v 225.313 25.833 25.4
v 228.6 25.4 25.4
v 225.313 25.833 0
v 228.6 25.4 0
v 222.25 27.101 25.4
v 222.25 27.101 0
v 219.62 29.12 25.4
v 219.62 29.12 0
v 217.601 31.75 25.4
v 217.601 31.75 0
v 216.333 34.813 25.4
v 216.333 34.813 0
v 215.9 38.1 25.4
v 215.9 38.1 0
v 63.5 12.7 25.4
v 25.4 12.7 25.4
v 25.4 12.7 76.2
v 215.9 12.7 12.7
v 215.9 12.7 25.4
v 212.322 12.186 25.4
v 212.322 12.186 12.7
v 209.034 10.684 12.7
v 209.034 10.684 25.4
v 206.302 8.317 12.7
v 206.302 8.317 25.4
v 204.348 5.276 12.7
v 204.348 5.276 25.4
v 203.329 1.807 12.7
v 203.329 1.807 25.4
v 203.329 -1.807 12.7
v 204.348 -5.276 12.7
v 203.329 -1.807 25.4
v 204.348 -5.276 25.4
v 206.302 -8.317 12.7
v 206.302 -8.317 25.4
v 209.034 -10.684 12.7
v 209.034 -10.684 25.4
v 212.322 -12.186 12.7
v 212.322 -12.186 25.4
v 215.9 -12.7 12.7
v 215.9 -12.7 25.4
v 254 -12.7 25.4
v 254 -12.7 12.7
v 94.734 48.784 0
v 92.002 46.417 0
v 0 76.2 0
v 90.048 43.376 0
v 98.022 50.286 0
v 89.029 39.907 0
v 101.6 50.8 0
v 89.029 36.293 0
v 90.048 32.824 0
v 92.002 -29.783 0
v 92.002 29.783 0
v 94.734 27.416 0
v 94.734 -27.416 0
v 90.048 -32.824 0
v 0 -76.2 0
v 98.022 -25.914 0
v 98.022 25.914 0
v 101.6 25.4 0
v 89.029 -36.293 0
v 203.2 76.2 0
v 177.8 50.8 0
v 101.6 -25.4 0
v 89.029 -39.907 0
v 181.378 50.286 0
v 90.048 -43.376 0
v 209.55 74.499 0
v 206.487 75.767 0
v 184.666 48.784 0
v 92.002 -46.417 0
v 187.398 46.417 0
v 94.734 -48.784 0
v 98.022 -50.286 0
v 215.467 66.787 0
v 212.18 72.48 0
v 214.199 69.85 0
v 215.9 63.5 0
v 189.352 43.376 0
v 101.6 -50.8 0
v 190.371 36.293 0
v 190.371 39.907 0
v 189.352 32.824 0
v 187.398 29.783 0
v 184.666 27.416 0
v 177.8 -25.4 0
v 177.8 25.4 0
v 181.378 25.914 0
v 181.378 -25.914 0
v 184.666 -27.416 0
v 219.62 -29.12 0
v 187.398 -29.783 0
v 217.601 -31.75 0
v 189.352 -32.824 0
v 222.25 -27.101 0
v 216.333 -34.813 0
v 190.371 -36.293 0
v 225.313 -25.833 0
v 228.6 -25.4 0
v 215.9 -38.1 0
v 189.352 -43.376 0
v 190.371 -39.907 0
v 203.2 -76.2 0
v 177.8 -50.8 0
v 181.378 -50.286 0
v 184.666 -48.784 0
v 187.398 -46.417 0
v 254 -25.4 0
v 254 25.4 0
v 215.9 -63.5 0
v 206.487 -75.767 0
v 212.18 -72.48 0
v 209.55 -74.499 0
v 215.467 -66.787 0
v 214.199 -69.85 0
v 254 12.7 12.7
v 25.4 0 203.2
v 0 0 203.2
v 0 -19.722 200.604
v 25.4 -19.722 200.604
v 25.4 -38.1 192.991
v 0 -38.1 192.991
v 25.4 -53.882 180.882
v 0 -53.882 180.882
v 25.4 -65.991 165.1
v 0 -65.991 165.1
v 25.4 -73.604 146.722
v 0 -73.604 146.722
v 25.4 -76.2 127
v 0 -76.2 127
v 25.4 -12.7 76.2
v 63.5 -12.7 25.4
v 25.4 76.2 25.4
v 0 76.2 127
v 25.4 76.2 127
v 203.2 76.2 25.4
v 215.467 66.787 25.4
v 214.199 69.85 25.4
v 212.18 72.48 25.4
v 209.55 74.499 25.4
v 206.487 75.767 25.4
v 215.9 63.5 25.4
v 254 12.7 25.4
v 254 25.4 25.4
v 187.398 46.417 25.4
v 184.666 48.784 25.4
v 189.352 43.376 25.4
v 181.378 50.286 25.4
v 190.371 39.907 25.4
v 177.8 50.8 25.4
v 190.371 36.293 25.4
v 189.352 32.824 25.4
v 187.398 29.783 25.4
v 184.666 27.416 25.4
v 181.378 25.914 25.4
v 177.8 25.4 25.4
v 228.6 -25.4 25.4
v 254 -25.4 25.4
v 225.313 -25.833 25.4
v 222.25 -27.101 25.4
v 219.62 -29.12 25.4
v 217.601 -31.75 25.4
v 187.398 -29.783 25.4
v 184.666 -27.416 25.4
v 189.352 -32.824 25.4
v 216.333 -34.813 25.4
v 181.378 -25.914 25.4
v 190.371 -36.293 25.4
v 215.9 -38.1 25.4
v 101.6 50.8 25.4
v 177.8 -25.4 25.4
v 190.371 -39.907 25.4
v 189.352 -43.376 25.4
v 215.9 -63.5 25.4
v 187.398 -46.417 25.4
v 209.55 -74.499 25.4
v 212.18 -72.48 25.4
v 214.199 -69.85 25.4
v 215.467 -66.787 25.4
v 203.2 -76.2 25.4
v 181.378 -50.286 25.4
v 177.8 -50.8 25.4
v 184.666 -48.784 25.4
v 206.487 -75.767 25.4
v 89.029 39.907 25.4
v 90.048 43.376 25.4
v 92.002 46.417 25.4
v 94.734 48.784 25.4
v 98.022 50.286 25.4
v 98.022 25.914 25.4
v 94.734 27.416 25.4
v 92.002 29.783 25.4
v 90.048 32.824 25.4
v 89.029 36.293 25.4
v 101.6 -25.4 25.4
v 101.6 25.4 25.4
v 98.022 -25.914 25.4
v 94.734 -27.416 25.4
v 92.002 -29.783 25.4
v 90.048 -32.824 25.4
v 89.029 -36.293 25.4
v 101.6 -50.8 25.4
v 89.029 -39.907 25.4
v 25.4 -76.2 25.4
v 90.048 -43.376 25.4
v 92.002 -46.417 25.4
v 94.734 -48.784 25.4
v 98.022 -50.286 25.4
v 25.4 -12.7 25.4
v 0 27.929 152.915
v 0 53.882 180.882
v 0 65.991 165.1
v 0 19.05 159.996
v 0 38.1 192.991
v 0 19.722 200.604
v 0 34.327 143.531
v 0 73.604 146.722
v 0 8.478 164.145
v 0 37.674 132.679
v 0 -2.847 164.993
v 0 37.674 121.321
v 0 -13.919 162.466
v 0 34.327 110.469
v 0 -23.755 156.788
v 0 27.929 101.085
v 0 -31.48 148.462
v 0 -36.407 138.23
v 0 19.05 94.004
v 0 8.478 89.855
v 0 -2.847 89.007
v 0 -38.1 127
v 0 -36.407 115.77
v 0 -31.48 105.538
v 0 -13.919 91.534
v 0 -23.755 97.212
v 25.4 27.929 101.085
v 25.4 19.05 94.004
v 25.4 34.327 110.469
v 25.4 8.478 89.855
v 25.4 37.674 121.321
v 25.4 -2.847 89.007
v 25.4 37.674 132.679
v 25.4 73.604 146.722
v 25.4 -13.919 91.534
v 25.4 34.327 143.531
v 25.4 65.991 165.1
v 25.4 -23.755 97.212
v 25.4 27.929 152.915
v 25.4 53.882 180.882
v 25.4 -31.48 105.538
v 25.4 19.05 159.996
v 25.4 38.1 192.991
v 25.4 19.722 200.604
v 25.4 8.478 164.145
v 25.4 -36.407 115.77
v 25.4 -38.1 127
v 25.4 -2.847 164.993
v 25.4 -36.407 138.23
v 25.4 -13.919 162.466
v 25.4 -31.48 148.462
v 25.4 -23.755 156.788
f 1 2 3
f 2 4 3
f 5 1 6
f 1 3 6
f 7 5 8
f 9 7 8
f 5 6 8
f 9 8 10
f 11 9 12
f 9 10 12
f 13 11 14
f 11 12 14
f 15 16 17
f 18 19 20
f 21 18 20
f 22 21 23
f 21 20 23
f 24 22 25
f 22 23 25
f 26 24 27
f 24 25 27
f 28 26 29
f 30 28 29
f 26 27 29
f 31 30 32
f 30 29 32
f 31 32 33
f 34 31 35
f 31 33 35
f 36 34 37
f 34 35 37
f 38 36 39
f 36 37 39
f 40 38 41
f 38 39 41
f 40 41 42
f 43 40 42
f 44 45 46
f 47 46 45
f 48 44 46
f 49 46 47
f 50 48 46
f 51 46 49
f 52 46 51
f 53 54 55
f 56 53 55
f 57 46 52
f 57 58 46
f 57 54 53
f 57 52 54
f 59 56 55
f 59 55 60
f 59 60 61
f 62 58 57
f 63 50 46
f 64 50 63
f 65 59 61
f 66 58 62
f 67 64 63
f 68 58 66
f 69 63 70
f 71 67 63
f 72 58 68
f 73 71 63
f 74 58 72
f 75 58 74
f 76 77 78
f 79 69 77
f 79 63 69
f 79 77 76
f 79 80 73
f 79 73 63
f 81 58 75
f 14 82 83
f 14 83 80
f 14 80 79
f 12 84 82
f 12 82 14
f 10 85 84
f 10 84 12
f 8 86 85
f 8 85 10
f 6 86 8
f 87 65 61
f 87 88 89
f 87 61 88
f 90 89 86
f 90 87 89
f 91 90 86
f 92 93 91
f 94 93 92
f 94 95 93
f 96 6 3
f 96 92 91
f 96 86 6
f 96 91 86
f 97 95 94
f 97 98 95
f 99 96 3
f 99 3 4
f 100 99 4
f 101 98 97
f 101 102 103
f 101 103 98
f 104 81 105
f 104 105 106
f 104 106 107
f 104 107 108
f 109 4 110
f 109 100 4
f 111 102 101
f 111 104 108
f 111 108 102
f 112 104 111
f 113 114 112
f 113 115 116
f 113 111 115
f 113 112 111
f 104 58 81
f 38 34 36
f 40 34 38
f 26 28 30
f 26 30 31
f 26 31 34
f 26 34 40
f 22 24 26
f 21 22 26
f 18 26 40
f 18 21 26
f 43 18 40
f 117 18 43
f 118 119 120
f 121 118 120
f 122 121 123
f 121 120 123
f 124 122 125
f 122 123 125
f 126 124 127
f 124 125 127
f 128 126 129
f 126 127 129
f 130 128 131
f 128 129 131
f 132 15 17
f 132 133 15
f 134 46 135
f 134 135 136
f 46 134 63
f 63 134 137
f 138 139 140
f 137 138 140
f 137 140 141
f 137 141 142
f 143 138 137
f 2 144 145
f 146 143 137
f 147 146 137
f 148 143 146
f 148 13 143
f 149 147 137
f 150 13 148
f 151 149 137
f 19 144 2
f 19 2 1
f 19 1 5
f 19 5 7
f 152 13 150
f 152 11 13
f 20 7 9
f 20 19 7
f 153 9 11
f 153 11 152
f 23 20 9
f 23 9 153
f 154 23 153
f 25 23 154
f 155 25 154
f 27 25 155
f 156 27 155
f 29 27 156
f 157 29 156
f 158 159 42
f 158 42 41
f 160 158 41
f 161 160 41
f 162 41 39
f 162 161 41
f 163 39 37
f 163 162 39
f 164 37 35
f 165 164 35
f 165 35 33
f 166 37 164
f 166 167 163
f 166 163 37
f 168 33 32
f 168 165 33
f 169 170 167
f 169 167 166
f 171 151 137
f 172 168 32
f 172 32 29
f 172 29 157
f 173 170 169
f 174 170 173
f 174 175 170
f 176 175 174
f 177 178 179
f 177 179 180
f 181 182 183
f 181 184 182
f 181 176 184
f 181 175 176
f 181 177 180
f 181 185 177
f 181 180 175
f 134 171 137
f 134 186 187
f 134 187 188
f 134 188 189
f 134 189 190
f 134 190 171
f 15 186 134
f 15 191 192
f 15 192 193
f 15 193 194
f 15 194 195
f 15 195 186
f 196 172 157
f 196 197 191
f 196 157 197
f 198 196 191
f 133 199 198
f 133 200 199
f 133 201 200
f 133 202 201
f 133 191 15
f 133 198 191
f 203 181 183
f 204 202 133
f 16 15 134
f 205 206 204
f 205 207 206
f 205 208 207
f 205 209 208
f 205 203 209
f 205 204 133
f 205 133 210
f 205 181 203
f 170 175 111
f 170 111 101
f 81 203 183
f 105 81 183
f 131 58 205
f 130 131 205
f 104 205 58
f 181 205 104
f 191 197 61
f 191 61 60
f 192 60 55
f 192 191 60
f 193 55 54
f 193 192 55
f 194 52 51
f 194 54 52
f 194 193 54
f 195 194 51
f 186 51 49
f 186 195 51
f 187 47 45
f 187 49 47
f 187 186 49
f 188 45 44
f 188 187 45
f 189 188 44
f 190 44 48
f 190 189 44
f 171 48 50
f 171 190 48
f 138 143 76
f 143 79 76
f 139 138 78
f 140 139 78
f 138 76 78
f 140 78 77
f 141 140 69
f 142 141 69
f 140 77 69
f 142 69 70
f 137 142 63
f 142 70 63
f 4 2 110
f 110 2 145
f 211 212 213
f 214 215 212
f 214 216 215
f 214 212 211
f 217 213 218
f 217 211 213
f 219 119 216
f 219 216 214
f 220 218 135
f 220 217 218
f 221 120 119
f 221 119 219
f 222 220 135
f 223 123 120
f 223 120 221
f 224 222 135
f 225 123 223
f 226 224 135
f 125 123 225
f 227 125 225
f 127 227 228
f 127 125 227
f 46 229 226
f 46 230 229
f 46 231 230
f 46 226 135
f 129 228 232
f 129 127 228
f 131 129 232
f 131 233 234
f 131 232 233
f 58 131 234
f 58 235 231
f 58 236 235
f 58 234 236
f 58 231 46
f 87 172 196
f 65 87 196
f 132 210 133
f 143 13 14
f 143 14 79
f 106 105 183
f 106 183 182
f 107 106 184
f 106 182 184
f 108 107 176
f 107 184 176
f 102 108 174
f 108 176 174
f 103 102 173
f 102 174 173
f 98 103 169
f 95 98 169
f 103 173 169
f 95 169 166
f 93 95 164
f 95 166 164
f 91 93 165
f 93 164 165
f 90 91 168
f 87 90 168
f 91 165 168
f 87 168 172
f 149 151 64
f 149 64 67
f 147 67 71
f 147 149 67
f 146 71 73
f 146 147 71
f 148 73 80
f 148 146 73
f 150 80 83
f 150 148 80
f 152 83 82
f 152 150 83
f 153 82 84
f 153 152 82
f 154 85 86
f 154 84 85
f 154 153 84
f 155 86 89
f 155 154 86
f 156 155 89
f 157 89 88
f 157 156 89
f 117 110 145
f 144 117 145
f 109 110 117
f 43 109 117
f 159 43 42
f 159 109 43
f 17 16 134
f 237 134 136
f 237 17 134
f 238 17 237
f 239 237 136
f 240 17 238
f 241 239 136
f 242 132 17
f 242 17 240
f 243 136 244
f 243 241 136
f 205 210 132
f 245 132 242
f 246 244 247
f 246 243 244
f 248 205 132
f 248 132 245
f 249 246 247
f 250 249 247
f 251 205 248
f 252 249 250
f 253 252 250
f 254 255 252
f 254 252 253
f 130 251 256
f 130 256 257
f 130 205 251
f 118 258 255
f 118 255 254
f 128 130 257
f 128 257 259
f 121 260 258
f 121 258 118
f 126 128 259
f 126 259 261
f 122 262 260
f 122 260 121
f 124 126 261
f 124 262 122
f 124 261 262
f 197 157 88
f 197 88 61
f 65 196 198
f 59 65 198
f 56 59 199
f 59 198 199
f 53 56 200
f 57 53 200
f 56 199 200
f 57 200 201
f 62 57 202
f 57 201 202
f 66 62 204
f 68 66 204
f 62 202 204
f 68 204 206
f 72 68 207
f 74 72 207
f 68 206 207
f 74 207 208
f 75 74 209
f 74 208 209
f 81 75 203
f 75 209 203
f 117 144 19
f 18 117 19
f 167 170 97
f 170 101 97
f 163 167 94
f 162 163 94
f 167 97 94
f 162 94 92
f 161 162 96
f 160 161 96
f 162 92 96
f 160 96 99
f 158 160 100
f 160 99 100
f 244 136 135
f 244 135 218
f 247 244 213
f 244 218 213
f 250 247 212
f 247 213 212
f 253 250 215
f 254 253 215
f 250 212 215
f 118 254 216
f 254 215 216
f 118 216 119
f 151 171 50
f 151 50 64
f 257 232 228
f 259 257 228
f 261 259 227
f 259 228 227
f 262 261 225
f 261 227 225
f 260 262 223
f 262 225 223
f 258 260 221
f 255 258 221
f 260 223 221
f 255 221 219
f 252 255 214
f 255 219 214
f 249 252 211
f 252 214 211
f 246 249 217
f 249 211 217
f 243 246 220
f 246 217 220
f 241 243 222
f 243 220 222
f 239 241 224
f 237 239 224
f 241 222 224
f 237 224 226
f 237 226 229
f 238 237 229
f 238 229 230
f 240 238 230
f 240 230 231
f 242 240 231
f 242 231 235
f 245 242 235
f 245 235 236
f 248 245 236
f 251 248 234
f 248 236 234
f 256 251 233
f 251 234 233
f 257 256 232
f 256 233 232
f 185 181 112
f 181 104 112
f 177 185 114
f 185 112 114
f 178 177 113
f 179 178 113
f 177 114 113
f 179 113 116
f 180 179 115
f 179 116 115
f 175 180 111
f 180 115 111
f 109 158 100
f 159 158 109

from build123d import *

# Parameters (mm, degrees)
F1_DEPTH  = 76.2
F3_DEPTH  = 12.7
F2_W      = 38.1
F2_H      = 50.8
F4_DEPTH  = 25.4
F5_DEPTH  = 25.4
F6_R      = 12.7
F7_R      = 38.1
F8_DEPTH  = 25.4
F9_DEPTH  = 25.401
F10_DEPTH = 12.7


# Not quite as in the source:
# - a pattern or mirror of a feature is missing from the dataset's text; its kind, count and spacing are read off the source's solid
# - a feature names something its author has since deleted; it is built from what else it names


with BuildPart() as f1:
    # F0 (on Front) → F1 (new body, symmetric)
    with BuildSketch(Plane.XZ):
        Polygon((25.4, 203.2), (0, 203.2), (0, 0), (254, 0), (254, 12.7), (254, 25.4), (63.5, 25.4), (25.4, 25.4), (25.4, 76.2), align=None)
    extrude(amount=F1_DEPTH, both=True)

    # F2 (on face) → F3 (cut)
    with BuildSketch(Plane.XY.offset(25.4)):
        with BuildLine():
            Line((215.9, -12.7), (254, -12.7))
            Line((254, -12.7), (254, 12.7))
            Line((254, 12.7), (215.9, 12.7))
            ThreePointArc((215.9, 12.7), (203.2, 0), (215.9, -12.7))
        make_face()
    extrude(amount=-F3_DEPTH, mode=Mode.SUBTRACT)

    # F2 (on face) → F4 (join)
    with BuildSketch(Plane.XY.offset(25.4)):
        with BuildLine():
            Line((25.4, -76.2), (215.9, -76.2))
            Line((215.9, -76.2), (215.9, -25.4))
            Line((215.9, -25.4), (254, -25.4))
            Line((254, -25.4), (254, -12.7))
            Line((254, -12.7), (215.9, -12.7))
            ThreePointArc((215.9, -12.7), (203.2, 0), (215.9, 12.7))
            Line((215.9, 12.7), (254, 12.7))
            Line((254, 12.7), (254, 25.4))
            Line((254, 25.4), (215.9, 25.4))
            Line((215.9, 25.4), (215.9, 76.2))
            Line((215.9, 76.2), (25.4, 76.2))
            Line((25.4, 76.2), (25.4, -76.2))
        make_face()
        with BuildLine():
            ThreePointArc((177.8, -25.4), (190.5, -38.1), (177.8, -50.8))
            Line((177.8, -50.8), (101.6, -50.8))
            ThreePointArc((101.6, -50.8), (88.9, -38.1), (101.6, -25.4))
            Line((101.6, -25.4), (177.8, -25.4))
        make_face(mode=Mode.SUBTRACT)
        with Locations((234.95, -50.8)):
            Rectangle(F2_W, F2_H)
        with BuildLine():
            Line((101.6, -50.8), (177.8, -50.8))
            ThreePointArc((177.8, -50.8), (190.5, -38.1), (177.8, -25.4))
            Line((177.8, -25.4), (101.6, -25.4))
            ThreePointArc((101.6, -25.4), (88.9, -38.1), (101.6, -50.8))
        make_face()
    extrude(amount=-F4_DEPTH)

    # F2 (on face) → F5 (cut)
    with BuildSketch(Plane.XY.offset(25.4)):
        with Locations((234.95, -50.8)):
            Rectangle(F2_W, F2_H)
        with Locations((234.95, 50.8)):
            Rectangle(F2_W, F2_H)
    extrude(amount=-F5_DEPTH, mode=Mode.SUBTRACT)

    # F6
    f6_edges = [f1.edges().sort_by_distance(p)[0] for p in [
        (215.9, -25.4, 12.7),
        (215.9, -76.2, 12.7),
        (215.9, 25.4, 12.7),
        (215.9, 76.2, 12.7),
    ]]
    fillet(f6_edges, radius=F6_R)

    # F7 (on face) → F8 (cut)
    with BuildSketch(Plane(origin=(0, 0, 0), x_dir=(0, -1, 0), z_dir=(-1, 0, 0))):
        with BuildLine():
            ThreePointArc((3.576e-07, 203.2), (53.8815368528, 180.8815366), (76.2, 127))
            Line((76.2, 127), (76.2, 203.2))
            Line((76.2, 203.2), (3.576e-07, 203.2))
        make_face()
        with Locations((0, 127)):
            Circle(F7_R)
        with BuildLine():
            ThreePointArc((-76.2, 127), (-53.8815366, 180.8815368528), (3.576e-07, 203.2))
            Line((3.576e-07, 203.2), (-76.2, 203.2))
            Line((-76.2, 203.2), (-76.2, 127))
        make_face()
    extrude(amount=-F8_DEPTH, mode=Mode.SUBTRACT)

    # F2 (on face) → F9 (cut, through all)
    with BuildSketch(Plane.XY.offset(25.4)):
        with BuildLine():
            Line((101.6, -50.8), (177.8, -50.8))
            ThreePointArc((177.8, -50.8), (190.5, -38.1), (177.8, -25.4))
            Line((177.8, -25.4), (101.6, -25.4))
            ThreePointArc((101.6, -25.4), (88.9, -38.1), (101.6, -50.8))
        make_face()
    f9 = extrude(amount=-F9_DEPTH, mode=Mode.SUBTRACT)

    # F9_copies: F9 across plane
    add(f9.mirror(Plane.ZX), mode=Mode.SUBTRACT)

    # F0 (on Front) → F10 (join, symmetric)
    with BuildSketch(Plane.XZ):
        Polygon((63.5, 25.4), (25.4, 76.2), (25.4, 25.4), align=None)
    extrude(amount=F10_DEPTH, both=True)


solid = f1.part
